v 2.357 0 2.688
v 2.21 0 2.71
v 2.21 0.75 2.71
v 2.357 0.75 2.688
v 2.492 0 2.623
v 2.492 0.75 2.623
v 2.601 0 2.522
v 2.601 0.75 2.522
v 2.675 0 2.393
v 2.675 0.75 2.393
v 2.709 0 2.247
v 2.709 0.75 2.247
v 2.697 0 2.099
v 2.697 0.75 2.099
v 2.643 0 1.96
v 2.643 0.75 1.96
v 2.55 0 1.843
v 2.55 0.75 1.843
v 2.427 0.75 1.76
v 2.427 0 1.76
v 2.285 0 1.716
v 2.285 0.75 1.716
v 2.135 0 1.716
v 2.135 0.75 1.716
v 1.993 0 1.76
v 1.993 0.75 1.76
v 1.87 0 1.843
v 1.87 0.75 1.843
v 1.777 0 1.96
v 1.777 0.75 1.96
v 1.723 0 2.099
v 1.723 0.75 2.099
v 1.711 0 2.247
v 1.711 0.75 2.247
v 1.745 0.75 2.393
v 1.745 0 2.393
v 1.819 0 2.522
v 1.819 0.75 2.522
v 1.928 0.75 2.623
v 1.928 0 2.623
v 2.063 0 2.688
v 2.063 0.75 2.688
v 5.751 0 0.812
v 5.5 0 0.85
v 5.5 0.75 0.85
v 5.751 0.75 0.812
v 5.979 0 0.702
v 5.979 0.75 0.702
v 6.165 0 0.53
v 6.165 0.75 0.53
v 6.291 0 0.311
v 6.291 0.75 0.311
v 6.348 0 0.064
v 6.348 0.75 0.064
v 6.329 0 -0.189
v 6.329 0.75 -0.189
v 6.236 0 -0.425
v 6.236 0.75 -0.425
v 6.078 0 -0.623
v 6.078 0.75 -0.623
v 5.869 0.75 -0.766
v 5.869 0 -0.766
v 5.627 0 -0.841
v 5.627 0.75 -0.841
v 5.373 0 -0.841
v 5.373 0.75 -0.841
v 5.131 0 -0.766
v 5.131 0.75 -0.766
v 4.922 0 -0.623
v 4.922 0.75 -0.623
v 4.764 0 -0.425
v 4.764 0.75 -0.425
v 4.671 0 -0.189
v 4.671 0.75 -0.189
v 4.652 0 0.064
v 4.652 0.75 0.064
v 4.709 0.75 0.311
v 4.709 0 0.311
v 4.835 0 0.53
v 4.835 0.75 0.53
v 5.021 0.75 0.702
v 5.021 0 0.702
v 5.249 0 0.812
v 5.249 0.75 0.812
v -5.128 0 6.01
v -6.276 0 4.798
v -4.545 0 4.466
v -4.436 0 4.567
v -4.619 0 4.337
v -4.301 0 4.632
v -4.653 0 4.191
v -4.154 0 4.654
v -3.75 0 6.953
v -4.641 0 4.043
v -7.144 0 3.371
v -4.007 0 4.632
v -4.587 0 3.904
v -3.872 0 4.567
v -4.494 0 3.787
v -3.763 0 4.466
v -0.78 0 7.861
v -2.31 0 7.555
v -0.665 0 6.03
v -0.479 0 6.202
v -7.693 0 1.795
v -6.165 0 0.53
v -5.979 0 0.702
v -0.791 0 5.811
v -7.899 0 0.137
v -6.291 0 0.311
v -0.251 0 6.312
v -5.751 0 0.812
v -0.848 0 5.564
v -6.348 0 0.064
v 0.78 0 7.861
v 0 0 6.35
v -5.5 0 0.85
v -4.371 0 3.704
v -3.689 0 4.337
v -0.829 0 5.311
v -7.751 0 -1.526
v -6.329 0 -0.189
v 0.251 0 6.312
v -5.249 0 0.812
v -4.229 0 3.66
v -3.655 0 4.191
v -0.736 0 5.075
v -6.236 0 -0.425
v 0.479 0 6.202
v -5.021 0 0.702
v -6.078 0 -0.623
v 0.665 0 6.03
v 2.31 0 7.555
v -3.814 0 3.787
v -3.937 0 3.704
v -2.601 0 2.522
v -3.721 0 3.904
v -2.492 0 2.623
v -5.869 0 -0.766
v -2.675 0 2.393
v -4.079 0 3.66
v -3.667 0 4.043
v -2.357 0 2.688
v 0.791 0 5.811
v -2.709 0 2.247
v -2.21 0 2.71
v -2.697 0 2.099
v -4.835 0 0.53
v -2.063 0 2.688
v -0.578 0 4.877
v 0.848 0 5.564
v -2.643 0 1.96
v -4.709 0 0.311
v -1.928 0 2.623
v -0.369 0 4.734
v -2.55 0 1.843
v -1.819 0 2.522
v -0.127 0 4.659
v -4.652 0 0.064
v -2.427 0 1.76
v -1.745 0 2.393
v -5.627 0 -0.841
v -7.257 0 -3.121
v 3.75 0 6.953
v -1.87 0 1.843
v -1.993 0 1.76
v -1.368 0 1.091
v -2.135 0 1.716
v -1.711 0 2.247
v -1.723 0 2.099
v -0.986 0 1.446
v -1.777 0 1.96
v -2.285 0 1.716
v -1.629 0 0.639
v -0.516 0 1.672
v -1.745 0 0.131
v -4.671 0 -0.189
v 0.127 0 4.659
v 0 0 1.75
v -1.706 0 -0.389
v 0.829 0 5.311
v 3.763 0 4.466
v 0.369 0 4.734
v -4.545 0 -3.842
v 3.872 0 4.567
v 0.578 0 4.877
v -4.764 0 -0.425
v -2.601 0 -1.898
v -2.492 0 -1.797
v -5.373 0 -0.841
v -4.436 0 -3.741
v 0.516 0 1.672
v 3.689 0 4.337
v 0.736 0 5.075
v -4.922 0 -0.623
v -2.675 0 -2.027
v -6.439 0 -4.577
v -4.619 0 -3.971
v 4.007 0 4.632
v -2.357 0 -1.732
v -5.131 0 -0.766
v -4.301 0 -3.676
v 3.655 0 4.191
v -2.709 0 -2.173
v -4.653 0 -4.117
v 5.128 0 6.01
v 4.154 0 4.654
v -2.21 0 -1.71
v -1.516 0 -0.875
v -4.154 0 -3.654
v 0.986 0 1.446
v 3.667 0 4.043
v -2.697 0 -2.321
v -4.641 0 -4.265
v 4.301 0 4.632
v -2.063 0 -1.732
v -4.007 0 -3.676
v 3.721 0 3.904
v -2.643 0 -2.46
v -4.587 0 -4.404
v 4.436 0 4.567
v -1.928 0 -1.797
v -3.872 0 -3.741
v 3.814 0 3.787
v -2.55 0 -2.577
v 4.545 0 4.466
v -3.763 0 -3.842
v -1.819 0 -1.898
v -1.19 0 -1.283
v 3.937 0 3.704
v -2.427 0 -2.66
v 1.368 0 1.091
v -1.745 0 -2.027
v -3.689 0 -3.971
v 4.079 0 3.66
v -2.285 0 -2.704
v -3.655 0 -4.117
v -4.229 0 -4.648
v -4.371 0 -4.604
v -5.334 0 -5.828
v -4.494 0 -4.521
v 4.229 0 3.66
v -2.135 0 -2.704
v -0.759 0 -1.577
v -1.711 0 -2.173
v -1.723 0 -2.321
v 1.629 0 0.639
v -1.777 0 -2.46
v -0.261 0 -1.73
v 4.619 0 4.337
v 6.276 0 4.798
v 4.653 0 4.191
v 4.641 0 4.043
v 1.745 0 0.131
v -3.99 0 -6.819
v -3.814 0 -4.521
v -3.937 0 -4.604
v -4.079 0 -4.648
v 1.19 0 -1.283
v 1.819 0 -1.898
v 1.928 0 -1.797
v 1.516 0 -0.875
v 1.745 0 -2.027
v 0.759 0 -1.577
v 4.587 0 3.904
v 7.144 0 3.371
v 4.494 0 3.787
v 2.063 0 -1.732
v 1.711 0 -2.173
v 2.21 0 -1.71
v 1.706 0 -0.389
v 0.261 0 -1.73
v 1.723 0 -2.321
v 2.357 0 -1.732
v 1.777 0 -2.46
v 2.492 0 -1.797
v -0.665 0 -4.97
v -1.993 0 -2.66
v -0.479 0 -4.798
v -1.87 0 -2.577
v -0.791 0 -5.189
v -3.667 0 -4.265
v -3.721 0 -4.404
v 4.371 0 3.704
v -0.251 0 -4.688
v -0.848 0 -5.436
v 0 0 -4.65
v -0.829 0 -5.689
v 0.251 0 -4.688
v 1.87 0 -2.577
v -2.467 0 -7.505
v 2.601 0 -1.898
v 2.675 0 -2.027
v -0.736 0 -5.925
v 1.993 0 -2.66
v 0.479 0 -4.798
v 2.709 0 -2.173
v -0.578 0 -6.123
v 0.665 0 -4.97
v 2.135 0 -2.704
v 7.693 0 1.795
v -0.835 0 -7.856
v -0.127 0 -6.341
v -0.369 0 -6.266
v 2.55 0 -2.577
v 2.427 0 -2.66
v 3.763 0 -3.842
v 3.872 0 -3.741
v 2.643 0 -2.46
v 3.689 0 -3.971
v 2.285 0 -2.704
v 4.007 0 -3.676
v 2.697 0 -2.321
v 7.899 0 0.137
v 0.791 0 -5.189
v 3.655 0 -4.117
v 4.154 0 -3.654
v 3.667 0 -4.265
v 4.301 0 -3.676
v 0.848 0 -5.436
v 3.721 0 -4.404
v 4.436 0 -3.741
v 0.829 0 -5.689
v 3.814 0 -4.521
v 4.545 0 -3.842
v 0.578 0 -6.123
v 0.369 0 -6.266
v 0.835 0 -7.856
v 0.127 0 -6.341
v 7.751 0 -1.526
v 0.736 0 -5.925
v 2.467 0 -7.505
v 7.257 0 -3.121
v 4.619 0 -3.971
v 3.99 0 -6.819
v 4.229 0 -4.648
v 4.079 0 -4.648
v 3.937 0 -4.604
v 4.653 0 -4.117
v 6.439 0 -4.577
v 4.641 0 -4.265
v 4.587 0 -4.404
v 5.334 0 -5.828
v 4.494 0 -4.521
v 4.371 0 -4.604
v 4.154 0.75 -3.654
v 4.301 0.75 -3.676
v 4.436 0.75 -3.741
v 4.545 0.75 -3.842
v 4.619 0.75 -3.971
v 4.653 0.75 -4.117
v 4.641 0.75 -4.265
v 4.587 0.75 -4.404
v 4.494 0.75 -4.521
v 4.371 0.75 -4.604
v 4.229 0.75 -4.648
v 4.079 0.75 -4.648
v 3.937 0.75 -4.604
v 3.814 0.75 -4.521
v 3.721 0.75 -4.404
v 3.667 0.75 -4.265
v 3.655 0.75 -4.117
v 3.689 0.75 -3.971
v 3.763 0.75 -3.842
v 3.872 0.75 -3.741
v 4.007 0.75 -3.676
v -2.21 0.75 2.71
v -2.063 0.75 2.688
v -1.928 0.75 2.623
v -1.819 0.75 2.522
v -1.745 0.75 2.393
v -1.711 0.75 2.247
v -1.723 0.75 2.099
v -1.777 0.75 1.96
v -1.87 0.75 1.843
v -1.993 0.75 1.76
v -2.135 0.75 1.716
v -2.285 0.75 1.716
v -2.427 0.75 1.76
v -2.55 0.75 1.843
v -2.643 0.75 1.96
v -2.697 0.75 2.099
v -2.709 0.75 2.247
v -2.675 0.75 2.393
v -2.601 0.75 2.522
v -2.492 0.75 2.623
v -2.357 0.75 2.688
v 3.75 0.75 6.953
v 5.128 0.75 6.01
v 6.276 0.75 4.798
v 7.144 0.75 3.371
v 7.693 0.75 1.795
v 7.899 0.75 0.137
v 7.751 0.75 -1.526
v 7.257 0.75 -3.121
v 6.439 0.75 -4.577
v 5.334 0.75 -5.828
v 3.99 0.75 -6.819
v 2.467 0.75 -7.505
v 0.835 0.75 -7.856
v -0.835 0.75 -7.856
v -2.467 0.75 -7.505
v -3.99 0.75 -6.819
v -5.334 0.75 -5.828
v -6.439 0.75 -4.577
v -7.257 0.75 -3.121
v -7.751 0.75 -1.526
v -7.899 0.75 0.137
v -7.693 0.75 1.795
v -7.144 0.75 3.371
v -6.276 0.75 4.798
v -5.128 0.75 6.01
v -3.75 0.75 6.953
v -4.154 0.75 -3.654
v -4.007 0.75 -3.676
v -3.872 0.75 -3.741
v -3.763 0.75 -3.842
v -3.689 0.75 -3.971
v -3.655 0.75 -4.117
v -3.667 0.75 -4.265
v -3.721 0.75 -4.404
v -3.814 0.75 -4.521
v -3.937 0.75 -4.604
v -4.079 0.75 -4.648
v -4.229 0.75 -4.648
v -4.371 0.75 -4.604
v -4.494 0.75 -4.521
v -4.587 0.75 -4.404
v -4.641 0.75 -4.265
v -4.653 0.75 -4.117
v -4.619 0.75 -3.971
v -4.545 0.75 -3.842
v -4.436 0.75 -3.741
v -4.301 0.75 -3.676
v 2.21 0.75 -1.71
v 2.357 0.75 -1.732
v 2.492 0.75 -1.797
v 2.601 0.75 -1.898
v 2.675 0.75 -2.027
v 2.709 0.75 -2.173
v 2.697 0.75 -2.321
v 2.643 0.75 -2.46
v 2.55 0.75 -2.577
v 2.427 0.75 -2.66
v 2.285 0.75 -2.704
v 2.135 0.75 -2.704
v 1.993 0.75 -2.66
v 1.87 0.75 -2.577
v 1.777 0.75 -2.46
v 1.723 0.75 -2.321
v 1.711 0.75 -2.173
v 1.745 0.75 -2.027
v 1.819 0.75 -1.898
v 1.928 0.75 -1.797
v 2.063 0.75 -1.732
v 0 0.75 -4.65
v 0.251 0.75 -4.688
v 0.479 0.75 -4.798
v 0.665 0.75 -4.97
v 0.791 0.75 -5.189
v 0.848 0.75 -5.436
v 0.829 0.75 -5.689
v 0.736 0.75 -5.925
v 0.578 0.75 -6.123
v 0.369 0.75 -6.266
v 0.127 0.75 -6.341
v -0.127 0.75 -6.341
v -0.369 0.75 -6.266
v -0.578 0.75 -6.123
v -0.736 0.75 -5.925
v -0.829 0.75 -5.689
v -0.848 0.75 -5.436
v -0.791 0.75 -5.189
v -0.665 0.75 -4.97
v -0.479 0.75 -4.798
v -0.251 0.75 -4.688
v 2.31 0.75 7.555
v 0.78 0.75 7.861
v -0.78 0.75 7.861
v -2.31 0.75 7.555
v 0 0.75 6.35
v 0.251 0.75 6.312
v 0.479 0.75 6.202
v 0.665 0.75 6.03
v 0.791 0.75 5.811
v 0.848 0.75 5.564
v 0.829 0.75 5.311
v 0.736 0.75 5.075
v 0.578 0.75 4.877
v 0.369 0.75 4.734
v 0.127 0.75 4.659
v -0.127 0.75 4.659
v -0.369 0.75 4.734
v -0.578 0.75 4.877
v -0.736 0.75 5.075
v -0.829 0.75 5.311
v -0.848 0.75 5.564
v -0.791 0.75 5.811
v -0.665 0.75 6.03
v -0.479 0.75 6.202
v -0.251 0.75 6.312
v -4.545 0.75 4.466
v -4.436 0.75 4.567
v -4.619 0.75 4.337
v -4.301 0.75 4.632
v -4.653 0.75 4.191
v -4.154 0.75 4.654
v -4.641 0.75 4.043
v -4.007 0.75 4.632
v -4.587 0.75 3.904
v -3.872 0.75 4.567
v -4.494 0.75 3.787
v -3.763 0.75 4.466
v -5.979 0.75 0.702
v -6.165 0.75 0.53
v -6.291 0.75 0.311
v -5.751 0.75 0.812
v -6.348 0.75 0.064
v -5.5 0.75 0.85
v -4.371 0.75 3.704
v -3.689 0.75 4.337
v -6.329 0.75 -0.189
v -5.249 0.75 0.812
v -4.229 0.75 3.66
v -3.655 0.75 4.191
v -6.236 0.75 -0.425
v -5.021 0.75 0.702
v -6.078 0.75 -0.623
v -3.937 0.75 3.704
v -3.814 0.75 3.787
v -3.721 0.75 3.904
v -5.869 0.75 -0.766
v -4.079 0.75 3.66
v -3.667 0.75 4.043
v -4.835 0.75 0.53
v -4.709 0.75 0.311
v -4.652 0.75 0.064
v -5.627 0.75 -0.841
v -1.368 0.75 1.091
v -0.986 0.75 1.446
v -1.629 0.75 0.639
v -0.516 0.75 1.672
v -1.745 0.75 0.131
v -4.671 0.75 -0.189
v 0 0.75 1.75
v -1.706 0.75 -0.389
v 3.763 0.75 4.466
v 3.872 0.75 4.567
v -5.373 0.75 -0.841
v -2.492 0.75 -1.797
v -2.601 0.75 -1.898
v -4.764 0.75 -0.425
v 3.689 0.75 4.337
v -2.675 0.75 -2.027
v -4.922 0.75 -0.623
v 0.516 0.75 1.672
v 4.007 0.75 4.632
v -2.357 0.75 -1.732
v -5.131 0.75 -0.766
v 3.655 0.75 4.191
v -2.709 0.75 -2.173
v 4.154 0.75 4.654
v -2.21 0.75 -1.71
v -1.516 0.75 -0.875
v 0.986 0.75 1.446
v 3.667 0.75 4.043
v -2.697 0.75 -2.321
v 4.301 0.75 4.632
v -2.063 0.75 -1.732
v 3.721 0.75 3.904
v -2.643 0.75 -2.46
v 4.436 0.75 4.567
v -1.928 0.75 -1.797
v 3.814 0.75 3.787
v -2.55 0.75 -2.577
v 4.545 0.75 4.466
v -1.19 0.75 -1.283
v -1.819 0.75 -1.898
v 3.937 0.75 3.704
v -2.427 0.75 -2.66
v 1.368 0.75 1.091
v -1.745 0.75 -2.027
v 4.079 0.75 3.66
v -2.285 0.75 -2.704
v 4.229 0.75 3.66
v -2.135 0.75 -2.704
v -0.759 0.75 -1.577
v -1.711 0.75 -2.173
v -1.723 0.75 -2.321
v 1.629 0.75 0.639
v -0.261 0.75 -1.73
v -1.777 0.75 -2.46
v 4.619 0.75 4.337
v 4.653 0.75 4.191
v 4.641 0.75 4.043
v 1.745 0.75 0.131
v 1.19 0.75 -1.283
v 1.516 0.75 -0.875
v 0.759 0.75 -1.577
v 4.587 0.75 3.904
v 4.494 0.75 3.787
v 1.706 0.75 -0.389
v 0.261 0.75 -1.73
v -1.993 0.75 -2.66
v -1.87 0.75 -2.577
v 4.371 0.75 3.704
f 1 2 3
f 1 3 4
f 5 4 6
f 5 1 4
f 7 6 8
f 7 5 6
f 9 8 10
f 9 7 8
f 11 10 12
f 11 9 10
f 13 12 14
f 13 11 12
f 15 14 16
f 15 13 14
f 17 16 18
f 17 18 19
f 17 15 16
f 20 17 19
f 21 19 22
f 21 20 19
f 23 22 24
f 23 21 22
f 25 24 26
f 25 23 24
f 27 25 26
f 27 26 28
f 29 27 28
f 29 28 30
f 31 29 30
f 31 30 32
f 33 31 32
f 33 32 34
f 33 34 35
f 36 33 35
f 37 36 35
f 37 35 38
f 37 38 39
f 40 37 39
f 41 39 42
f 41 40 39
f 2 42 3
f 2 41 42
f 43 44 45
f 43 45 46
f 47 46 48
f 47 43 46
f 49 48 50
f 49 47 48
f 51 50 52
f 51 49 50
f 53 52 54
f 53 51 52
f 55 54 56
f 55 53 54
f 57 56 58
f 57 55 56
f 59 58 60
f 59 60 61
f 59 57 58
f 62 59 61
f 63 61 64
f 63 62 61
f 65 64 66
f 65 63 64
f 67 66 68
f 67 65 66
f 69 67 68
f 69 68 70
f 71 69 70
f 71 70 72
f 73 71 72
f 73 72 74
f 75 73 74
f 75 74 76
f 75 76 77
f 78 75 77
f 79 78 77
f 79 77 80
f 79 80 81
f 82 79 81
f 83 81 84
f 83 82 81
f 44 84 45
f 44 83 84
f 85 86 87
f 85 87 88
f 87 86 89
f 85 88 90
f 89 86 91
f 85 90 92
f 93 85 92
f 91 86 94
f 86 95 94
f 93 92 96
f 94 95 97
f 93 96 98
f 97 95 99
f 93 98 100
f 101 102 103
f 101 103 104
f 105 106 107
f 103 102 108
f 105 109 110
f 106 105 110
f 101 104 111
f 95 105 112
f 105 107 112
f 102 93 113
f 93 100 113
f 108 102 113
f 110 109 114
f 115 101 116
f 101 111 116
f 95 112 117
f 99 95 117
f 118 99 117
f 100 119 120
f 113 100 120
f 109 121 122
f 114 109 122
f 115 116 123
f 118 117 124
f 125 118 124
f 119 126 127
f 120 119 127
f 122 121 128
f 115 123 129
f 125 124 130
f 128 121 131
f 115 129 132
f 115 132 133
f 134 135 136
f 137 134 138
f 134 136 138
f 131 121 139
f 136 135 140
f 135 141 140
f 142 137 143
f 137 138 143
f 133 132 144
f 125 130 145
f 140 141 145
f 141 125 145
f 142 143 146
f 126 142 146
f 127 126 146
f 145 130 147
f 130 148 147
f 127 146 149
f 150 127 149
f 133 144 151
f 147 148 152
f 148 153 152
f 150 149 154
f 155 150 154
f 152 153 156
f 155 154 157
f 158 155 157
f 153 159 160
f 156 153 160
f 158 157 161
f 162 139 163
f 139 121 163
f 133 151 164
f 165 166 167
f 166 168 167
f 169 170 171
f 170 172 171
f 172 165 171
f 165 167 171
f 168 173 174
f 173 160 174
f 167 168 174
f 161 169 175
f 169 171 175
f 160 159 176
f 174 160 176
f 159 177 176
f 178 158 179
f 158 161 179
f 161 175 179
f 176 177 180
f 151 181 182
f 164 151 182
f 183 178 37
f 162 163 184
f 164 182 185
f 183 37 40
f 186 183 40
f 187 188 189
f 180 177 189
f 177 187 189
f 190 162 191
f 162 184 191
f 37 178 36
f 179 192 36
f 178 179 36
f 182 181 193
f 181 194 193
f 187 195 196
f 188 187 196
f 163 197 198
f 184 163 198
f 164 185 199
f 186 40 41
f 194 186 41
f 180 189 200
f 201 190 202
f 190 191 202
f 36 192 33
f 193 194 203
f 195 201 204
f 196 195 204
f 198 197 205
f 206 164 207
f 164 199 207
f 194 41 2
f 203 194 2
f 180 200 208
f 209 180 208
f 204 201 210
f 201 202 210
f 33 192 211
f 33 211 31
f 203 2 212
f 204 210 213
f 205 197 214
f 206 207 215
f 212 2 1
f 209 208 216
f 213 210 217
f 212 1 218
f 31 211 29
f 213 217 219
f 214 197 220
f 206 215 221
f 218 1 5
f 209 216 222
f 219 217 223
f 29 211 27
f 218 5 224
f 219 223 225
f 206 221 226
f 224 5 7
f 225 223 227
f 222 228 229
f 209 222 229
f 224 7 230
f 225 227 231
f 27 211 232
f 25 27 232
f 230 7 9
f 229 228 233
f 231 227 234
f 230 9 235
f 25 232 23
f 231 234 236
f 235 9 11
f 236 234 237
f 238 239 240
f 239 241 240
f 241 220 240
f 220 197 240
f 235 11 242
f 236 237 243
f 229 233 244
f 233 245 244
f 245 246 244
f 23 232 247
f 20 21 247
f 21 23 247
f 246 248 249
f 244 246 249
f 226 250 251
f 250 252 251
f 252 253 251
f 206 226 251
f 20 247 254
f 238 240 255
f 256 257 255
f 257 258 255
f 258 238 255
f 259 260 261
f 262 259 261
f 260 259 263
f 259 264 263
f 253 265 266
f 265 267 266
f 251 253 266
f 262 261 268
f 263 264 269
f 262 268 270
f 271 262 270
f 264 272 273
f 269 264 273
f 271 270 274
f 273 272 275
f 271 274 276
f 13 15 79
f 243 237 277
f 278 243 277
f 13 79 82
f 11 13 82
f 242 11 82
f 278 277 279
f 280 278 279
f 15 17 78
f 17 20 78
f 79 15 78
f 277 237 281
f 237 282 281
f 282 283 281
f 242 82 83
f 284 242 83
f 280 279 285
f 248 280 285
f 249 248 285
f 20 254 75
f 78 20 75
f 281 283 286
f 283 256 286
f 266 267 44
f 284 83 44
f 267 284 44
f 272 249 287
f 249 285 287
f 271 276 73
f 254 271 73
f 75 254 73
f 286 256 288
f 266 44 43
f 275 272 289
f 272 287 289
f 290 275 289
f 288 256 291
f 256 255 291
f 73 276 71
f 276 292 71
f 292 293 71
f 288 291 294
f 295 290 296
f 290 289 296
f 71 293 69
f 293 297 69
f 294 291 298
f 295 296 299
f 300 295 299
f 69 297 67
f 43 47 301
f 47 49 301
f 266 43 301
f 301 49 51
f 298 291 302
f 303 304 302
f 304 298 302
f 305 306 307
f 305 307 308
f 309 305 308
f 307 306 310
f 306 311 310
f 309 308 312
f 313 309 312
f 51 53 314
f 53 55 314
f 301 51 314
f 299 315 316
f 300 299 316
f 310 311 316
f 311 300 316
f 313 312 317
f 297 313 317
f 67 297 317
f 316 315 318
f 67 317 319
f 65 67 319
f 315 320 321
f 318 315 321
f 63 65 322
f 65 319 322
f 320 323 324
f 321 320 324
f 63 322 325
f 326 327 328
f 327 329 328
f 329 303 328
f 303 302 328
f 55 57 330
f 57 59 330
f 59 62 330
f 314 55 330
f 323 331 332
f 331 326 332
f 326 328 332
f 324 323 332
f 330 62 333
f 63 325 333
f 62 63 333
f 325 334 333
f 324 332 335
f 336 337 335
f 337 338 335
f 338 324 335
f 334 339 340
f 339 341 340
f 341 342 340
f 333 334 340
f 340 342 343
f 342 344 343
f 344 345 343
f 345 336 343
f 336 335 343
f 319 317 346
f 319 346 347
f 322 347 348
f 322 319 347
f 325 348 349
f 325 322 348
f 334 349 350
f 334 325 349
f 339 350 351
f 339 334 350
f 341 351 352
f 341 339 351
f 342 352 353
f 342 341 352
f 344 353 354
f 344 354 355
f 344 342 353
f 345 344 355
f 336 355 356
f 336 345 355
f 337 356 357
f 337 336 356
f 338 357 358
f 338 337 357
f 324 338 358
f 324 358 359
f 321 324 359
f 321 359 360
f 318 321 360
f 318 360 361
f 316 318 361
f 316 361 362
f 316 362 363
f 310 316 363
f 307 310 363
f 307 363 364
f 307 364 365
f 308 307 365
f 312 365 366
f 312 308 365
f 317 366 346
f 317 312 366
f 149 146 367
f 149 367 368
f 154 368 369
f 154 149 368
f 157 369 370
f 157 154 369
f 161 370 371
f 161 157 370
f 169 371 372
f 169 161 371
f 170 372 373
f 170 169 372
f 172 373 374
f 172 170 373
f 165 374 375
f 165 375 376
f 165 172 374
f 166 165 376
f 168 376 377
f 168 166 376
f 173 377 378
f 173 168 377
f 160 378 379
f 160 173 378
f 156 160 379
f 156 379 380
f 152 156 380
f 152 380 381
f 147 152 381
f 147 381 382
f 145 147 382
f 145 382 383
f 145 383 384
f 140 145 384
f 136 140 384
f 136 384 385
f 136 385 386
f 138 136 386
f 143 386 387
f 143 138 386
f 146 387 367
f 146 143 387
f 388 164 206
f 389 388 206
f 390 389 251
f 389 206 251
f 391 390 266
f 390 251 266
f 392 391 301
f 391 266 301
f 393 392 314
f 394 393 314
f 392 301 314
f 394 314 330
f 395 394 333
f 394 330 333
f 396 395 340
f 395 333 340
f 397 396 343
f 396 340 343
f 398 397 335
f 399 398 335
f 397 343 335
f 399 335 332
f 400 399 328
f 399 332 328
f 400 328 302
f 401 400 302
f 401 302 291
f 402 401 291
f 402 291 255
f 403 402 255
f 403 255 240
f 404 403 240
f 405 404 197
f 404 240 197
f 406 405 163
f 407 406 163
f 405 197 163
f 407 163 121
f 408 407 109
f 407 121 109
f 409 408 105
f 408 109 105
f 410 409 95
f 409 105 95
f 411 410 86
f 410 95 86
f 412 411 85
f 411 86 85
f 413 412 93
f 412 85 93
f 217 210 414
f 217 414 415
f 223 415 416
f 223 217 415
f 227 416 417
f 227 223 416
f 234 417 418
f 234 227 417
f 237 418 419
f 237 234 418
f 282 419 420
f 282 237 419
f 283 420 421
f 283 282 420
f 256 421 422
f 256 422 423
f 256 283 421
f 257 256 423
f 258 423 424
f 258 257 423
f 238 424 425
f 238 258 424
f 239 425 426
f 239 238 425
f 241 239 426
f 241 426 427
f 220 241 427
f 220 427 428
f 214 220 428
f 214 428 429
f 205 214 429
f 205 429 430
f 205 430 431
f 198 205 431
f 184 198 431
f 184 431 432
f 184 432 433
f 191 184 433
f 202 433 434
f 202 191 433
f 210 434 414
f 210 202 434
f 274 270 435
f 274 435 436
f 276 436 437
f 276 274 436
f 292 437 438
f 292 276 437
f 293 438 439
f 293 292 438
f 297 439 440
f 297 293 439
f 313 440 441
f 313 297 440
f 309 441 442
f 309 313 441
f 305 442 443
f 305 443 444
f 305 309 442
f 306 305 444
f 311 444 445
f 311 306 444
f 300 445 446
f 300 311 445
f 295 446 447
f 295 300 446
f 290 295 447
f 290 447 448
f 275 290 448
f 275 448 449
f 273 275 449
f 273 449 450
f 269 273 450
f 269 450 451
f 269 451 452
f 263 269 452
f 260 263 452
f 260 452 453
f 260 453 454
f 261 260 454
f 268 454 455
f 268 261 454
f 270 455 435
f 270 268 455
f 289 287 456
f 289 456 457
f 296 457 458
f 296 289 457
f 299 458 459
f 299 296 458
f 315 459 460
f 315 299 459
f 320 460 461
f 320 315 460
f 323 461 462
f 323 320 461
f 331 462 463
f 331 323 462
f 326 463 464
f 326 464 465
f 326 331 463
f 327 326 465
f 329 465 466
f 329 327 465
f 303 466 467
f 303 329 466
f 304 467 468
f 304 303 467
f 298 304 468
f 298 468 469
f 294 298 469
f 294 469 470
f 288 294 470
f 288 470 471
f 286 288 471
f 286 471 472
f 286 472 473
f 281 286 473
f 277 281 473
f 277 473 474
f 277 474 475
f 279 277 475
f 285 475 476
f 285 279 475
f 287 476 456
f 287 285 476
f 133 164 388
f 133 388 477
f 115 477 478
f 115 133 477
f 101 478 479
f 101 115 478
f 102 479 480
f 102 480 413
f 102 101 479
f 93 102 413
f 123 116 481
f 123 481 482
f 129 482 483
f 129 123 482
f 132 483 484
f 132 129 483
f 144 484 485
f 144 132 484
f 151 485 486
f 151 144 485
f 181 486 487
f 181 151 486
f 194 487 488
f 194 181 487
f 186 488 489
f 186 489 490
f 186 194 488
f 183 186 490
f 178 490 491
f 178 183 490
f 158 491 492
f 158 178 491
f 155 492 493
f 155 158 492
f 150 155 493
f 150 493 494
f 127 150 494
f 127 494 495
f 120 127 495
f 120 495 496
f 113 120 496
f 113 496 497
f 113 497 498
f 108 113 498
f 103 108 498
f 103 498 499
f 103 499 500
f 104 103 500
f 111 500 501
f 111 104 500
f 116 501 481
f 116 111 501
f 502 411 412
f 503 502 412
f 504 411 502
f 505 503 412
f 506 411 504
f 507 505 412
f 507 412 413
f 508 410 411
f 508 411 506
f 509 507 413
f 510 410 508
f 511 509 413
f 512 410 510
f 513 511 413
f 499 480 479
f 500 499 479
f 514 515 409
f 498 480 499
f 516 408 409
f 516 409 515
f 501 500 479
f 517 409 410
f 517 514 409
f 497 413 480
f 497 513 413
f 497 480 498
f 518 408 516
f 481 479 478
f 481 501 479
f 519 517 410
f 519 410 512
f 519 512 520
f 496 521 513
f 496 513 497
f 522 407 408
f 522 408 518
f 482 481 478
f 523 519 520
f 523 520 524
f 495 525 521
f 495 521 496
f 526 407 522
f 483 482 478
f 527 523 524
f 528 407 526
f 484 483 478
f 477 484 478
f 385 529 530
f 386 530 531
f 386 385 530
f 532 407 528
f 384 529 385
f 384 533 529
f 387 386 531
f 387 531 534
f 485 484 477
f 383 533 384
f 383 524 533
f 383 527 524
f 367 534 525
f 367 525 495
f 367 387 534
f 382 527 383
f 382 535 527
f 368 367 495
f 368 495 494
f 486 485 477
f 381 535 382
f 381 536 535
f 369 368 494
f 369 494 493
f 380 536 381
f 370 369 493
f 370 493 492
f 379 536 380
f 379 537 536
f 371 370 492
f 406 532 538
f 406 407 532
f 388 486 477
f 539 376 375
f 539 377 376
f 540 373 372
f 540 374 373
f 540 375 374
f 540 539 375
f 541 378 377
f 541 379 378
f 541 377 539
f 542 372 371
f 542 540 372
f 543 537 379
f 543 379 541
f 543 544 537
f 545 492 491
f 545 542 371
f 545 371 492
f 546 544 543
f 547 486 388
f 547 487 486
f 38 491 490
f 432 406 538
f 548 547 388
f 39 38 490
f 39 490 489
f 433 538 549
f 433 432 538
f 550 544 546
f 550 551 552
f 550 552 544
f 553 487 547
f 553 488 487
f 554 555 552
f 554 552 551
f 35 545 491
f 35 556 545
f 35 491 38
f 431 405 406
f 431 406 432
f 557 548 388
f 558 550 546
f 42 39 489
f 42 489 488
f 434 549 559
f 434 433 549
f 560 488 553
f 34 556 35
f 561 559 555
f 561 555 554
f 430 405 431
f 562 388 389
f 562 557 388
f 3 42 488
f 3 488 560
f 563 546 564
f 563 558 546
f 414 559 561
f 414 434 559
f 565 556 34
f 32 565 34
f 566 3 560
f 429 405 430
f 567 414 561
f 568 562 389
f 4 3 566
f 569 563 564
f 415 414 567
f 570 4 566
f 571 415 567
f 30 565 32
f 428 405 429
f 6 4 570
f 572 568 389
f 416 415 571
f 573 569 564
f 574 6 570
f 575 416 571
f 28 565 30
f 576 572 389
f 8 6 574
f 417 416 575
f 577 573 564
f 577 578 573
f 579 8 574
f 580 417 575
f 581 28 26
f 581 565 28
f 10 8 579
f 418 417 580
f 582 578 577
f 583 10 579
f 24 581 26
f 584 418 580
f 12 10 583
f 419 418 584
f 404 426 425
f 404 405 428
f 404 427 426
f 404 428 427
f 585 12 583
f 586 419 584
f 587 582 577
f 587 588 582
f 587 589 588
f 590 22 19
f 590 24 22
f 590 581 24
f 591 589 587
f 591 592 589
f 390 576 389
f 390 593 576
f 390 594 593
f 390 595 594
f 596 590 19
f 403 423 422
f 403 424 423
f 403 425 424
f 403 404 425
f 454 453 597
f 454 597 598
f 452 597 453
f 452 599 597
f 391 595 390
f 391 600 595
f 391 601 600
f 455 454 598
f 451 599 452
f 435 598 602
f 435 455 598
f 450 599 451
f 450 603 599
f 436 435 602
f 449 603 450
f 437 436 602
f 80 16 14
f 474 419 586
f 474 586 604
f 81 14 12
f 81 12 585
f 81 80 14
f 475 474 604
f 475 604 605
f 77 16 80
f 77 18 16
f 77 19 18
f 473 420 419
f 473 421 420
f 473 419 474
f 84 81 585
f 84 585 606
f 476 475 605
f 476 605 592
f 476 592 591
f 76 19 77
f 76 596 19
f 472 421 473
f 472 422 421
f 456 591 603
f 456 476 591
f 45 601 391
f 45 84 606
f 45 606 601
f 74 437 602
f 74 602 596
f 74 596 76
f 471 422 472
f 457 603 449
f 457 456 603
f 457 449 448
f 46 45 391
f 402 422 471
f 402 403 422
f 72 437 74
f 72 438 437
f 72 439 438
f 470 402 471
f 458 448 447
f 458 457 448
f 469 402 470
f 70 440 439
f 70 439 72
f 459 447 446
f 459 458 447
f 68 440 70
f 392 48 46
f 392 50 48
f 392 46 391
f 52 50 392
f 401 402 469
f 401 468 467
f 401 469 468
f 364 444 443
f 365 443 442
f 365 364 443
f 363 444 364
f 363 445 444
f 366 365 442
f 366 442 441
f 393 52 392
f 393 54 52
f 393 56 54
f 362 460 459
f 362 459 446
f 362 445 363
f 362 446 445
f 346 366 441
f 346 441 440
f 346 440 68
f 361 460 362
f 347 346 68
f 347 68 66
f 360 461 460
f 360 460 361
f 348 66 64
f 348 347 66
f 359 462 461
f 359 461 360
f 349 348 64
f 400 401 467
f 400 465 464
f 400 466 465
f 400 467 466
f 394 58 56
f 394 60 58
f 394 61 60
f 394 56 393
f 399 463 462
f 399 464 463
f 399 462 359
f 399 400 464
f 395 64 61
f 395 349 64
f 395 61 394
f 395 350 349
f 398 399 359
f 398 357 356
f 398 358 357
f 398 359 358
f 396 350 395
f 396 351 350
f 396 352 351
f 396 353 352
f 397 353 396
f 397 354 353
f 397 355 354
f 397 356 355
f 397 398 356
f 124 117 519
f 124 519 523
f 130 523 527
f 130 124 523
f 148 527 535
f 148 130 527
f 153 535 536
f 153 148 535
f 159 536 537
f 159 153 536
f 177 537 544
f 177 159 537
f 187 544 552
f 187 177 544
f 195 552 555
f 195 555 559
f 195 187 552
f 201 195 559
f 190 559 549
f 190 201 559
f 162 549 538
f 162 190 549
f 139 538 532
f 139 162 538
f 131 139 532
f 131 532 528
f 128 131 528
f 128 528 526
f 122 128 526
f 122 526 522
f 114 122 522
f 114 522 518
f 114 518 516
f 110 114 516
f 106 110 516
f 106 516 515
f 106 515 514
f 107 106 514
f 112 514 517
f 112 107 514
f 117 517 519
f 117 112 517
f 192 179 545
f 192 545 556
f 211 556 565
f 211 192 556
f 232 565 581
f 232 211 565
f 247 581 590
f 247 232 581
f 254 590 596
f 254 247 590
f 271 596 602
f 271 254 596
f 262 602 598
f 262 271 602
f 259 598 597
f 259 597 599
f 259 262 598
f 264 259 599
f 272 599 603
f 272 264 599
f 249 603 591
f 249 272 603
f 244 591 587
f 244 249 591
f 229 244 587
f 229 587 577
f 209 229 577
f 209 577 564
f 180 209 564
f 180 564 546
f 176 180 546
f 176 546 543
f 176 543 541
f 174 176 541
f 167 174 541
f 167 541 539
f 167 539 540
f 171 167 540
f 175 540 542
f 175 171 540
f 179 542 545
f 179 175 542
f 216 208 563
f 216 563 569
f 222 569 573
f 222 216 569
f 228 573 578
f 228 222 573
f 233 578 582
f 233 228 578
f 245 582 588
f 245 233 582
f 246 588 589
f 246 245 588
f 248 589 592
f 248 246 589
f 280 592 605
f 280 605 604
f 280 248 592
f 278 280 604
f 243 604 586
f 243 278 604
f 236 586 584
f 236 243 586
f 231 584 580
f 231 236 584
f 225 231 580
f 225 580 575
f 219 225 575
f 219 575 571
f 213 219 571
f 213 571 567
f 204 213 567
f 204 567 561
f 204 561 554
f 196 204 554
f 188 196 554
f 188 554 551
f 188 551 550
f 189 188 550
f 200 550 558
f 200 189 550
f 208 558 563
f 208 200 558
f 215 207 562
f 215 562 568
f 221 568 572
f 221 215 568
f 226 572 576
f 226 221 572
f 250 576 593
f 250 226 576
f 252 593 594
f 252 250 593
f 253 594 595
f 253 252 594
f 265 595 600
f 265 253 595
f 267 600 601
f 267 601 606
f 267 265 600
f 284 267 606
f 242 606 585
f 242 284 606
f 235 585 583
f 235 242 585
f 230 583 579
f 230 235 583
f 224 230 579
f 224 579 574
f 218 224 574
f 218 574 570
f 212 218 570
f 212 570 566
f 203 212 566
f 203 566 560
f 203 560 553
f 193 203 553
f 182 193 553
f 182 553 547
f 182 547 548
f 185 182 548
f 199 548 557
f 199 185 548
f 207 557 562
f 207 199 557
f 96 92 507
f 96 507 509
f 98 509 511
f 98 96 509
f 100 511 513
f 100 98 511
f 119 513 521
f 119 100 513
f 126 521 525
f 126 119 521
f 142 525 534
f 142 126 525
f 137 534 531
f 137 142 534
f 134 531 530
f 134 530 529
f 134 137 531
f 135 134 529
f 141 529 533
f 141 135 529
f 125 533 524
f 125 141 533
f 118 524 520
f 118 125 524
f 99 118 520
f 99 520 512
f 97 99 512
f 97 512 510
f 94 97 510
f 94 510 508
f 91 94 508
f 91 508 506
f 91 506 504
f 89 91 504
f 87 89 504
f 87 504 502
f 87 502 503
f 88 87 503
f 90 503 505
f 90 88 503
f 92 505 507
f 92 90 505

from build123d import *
from build123d.topology import SkipClean

# Parameters (mm, degrees)
SKETCH1_R           = 0.85
SKETCH1_R_2         = 1.75
SKETCH1_R_3         = 0.5
SKETCH1_R_4         = 0.25
BOSS_EXTRUDE1_DEPTH = 0.75
BOSS_EXTRUDE4_START = -0.75
SKETCH5_R           = 0.25
SKETCH5_R_2         = 0.289113168
BOSS_EXTRUDE4_DEPTH = 0.75
CUT_EXTRUDE1_START  = -0.75
CUT_EXTRUDE1_DEPTH  = 0.75


with BuildPart() as part:
    # Sketch1 → Boss-Extrude1 (new body)
    with BuildSketch(Plane(origin=(0, 0, 0), x_dir=(1, 0, 0), z_dir=(0, 1, 0))):
        with BuildLine():
            Line((-3.75, -6.953236656), (-3.75, -14.65))
            Line((-3.75, -14.65), (3.75, -14.65))
            Line((3.75, -14.65), (3.75, -6.953236656))
            ThreePointArc((3.75, -6.953236656), (0, 7.9), (-3.75, -6.953236656))
        make_face()
        with Locations((5.5, 0)):
            Circle(SKETCH1_R, mode=Mode.SUBTRACT)
        with Locations((0, -5.5)):
            Circle(SKETCH1_R, mode=Mode.SUBTRACT)
        with Locations((-5.5, 0)):
            Circle(SKETCH1_R, mode=Mode.SUBTRACT)
        with Locations((0, 5.5)):
            Circle(SKETCH1_R, mode=Mode.SUBTRACT)
        Circle(SKETCH1_R_2, mode=Mode.SUBTRACT)
        with Locations((-4.154, 4.154)):
            Circle(SKETCH1_R_3, mode=Mode.SUBTRACT)
        with Locations((-2.21, 2.21)):
            Circle(SKETCH1_R_3, mode=Mode.SUBTRACT)
        with Locations((4.154, 4.154)):
            Circle(SKETCH1_R_3, mode=Mode.SUBTRACT)
        with Locations((2.21, 2.21)):
            Circle(SKETCH1_R_3, mode=Mode.SUBTRACT)
        with Locations((4.154, -4.154)):
            Circle(SKETCH1_R_3, mode=Mode.SUBTRACT)
        with Locations((2.21, -2.21)):
            Circle(SKETCH1_R_3, mode=Mode.SUBTRACT)
        with Locations((-4.154, -4.154)):
            Circle(SKETCH1_R_3, mode=Mode.SUBTRACT)
        with Locations((-2.21, -2.21)):
            Circle(SKETCH1_R_3, mode=Mode.SUBTRACT)
        with Locations((-3, 0)):
            Circle(SKETCH1_R_4, mode=Mode.SUBTRACT)
        with Locations((-1.5, -10.75)):
            Circle(SKETCH1_R_4, mode=Mode.SUBTRACT)
        with Locations((3, 0)):
            Circle(SKETCH1_R_4, mode=Mode.SUBTRACT)
        with Locations((1.5, -10.75)):
            Circle(SKETCH1_R_4, mode=Mode.SUBTRACT)
        with Locations((-6.2, 2.25)):
            Circle(SKETCH1_R_4, mode=Mode.SUBTRACT)
        with Locations((0, -9.75)):
            Circle(SKETCH1_R_4, mode=Mode.SUBTRACT)
        with Locations((0, -7.75)):
            Circle(SKETCH1_R_4, mode=Mode.SUBTRACT)
        with Locations((-1, -8.75)):
            Circle(SKETCH1_R_4, mode=Mode.SUBTRACT)
        with Locations((1, -8.75)):
            Circle(SKETCH1_R_4, mode=Mode.SUBTRACT)
        with Locations((-5.9, 3.55)):
            Circle(SKETCH1_R_4, mode=Mode.SUBTRACT)
        with Locations((6.2, 2.25)):
            Circle(SKETCH1_R_4, mode=Mode.SUBTRACT)
        with Locations((5.9, 3.55)):
            Circle(SKETCH1_R_4, mode=Mode.SUBTRACT)
    extrude(amount=BOSS_EXTRUDE1_DEPTH)

    # Sketch5 → Boss-Extrude4 (add)
    with BuildSketch(Plane(origin=(0, 0.75, 0), x_dir=(1, 0, 0), z_dir=(0, 1, 0)).offset(BOSS_EXTRUDE4_START)):
        with Locations((-5.9, 3.55)):
            Circle(SKETCH5_R)
        with Locations((-6.2, 2.25)):
            Circle(SKETCH5_R)
        with Locations((5.9, 3.55)):
            Circle(SKETCH5_R)
        with Locations((6.2, 2.25)):
            Circle(SKETCH5_R)
        with Locations((3, 0)):
            Circle(SKETCH5_R)
        with Locations((-3, 0)):
            Circle(SKETCH5_R_2)
        with Locations((0, -7.75)):
            Circle(SKETCH5_R)
    extrude(amount=BOSS_EXTRUDE4_DEPTH)

    # Sketch6 → Cut-Extrude1 (cut)
    with SkipClean():  # the faces are left unmerged after this step: merging them gives an invalid solid
        with BuildSketch(Plane(origin=(0, 0.75, 0), x_dir=(1, 0, 0), z_dir=(0, 1, 0)).offset(CUT_EXTRUDE1_START)):
            with BuildLine():
                ThreePointArc((3.75, -6.953236656), (0, -7.9), (-3.75, -6.953236656))
                Line((-3.75, -6.953236656), (-3.75, -14.65))
                Line((-3.75, -14.65), (3.75, -14.65))
                Line((3.75, -14.65), (3.75, -6.953236656))
            make_face()
        extrude(amount=CUT_EXTRUDE1_DEPTH, mode=Mode.SUBTRACT)


solid = part.part
